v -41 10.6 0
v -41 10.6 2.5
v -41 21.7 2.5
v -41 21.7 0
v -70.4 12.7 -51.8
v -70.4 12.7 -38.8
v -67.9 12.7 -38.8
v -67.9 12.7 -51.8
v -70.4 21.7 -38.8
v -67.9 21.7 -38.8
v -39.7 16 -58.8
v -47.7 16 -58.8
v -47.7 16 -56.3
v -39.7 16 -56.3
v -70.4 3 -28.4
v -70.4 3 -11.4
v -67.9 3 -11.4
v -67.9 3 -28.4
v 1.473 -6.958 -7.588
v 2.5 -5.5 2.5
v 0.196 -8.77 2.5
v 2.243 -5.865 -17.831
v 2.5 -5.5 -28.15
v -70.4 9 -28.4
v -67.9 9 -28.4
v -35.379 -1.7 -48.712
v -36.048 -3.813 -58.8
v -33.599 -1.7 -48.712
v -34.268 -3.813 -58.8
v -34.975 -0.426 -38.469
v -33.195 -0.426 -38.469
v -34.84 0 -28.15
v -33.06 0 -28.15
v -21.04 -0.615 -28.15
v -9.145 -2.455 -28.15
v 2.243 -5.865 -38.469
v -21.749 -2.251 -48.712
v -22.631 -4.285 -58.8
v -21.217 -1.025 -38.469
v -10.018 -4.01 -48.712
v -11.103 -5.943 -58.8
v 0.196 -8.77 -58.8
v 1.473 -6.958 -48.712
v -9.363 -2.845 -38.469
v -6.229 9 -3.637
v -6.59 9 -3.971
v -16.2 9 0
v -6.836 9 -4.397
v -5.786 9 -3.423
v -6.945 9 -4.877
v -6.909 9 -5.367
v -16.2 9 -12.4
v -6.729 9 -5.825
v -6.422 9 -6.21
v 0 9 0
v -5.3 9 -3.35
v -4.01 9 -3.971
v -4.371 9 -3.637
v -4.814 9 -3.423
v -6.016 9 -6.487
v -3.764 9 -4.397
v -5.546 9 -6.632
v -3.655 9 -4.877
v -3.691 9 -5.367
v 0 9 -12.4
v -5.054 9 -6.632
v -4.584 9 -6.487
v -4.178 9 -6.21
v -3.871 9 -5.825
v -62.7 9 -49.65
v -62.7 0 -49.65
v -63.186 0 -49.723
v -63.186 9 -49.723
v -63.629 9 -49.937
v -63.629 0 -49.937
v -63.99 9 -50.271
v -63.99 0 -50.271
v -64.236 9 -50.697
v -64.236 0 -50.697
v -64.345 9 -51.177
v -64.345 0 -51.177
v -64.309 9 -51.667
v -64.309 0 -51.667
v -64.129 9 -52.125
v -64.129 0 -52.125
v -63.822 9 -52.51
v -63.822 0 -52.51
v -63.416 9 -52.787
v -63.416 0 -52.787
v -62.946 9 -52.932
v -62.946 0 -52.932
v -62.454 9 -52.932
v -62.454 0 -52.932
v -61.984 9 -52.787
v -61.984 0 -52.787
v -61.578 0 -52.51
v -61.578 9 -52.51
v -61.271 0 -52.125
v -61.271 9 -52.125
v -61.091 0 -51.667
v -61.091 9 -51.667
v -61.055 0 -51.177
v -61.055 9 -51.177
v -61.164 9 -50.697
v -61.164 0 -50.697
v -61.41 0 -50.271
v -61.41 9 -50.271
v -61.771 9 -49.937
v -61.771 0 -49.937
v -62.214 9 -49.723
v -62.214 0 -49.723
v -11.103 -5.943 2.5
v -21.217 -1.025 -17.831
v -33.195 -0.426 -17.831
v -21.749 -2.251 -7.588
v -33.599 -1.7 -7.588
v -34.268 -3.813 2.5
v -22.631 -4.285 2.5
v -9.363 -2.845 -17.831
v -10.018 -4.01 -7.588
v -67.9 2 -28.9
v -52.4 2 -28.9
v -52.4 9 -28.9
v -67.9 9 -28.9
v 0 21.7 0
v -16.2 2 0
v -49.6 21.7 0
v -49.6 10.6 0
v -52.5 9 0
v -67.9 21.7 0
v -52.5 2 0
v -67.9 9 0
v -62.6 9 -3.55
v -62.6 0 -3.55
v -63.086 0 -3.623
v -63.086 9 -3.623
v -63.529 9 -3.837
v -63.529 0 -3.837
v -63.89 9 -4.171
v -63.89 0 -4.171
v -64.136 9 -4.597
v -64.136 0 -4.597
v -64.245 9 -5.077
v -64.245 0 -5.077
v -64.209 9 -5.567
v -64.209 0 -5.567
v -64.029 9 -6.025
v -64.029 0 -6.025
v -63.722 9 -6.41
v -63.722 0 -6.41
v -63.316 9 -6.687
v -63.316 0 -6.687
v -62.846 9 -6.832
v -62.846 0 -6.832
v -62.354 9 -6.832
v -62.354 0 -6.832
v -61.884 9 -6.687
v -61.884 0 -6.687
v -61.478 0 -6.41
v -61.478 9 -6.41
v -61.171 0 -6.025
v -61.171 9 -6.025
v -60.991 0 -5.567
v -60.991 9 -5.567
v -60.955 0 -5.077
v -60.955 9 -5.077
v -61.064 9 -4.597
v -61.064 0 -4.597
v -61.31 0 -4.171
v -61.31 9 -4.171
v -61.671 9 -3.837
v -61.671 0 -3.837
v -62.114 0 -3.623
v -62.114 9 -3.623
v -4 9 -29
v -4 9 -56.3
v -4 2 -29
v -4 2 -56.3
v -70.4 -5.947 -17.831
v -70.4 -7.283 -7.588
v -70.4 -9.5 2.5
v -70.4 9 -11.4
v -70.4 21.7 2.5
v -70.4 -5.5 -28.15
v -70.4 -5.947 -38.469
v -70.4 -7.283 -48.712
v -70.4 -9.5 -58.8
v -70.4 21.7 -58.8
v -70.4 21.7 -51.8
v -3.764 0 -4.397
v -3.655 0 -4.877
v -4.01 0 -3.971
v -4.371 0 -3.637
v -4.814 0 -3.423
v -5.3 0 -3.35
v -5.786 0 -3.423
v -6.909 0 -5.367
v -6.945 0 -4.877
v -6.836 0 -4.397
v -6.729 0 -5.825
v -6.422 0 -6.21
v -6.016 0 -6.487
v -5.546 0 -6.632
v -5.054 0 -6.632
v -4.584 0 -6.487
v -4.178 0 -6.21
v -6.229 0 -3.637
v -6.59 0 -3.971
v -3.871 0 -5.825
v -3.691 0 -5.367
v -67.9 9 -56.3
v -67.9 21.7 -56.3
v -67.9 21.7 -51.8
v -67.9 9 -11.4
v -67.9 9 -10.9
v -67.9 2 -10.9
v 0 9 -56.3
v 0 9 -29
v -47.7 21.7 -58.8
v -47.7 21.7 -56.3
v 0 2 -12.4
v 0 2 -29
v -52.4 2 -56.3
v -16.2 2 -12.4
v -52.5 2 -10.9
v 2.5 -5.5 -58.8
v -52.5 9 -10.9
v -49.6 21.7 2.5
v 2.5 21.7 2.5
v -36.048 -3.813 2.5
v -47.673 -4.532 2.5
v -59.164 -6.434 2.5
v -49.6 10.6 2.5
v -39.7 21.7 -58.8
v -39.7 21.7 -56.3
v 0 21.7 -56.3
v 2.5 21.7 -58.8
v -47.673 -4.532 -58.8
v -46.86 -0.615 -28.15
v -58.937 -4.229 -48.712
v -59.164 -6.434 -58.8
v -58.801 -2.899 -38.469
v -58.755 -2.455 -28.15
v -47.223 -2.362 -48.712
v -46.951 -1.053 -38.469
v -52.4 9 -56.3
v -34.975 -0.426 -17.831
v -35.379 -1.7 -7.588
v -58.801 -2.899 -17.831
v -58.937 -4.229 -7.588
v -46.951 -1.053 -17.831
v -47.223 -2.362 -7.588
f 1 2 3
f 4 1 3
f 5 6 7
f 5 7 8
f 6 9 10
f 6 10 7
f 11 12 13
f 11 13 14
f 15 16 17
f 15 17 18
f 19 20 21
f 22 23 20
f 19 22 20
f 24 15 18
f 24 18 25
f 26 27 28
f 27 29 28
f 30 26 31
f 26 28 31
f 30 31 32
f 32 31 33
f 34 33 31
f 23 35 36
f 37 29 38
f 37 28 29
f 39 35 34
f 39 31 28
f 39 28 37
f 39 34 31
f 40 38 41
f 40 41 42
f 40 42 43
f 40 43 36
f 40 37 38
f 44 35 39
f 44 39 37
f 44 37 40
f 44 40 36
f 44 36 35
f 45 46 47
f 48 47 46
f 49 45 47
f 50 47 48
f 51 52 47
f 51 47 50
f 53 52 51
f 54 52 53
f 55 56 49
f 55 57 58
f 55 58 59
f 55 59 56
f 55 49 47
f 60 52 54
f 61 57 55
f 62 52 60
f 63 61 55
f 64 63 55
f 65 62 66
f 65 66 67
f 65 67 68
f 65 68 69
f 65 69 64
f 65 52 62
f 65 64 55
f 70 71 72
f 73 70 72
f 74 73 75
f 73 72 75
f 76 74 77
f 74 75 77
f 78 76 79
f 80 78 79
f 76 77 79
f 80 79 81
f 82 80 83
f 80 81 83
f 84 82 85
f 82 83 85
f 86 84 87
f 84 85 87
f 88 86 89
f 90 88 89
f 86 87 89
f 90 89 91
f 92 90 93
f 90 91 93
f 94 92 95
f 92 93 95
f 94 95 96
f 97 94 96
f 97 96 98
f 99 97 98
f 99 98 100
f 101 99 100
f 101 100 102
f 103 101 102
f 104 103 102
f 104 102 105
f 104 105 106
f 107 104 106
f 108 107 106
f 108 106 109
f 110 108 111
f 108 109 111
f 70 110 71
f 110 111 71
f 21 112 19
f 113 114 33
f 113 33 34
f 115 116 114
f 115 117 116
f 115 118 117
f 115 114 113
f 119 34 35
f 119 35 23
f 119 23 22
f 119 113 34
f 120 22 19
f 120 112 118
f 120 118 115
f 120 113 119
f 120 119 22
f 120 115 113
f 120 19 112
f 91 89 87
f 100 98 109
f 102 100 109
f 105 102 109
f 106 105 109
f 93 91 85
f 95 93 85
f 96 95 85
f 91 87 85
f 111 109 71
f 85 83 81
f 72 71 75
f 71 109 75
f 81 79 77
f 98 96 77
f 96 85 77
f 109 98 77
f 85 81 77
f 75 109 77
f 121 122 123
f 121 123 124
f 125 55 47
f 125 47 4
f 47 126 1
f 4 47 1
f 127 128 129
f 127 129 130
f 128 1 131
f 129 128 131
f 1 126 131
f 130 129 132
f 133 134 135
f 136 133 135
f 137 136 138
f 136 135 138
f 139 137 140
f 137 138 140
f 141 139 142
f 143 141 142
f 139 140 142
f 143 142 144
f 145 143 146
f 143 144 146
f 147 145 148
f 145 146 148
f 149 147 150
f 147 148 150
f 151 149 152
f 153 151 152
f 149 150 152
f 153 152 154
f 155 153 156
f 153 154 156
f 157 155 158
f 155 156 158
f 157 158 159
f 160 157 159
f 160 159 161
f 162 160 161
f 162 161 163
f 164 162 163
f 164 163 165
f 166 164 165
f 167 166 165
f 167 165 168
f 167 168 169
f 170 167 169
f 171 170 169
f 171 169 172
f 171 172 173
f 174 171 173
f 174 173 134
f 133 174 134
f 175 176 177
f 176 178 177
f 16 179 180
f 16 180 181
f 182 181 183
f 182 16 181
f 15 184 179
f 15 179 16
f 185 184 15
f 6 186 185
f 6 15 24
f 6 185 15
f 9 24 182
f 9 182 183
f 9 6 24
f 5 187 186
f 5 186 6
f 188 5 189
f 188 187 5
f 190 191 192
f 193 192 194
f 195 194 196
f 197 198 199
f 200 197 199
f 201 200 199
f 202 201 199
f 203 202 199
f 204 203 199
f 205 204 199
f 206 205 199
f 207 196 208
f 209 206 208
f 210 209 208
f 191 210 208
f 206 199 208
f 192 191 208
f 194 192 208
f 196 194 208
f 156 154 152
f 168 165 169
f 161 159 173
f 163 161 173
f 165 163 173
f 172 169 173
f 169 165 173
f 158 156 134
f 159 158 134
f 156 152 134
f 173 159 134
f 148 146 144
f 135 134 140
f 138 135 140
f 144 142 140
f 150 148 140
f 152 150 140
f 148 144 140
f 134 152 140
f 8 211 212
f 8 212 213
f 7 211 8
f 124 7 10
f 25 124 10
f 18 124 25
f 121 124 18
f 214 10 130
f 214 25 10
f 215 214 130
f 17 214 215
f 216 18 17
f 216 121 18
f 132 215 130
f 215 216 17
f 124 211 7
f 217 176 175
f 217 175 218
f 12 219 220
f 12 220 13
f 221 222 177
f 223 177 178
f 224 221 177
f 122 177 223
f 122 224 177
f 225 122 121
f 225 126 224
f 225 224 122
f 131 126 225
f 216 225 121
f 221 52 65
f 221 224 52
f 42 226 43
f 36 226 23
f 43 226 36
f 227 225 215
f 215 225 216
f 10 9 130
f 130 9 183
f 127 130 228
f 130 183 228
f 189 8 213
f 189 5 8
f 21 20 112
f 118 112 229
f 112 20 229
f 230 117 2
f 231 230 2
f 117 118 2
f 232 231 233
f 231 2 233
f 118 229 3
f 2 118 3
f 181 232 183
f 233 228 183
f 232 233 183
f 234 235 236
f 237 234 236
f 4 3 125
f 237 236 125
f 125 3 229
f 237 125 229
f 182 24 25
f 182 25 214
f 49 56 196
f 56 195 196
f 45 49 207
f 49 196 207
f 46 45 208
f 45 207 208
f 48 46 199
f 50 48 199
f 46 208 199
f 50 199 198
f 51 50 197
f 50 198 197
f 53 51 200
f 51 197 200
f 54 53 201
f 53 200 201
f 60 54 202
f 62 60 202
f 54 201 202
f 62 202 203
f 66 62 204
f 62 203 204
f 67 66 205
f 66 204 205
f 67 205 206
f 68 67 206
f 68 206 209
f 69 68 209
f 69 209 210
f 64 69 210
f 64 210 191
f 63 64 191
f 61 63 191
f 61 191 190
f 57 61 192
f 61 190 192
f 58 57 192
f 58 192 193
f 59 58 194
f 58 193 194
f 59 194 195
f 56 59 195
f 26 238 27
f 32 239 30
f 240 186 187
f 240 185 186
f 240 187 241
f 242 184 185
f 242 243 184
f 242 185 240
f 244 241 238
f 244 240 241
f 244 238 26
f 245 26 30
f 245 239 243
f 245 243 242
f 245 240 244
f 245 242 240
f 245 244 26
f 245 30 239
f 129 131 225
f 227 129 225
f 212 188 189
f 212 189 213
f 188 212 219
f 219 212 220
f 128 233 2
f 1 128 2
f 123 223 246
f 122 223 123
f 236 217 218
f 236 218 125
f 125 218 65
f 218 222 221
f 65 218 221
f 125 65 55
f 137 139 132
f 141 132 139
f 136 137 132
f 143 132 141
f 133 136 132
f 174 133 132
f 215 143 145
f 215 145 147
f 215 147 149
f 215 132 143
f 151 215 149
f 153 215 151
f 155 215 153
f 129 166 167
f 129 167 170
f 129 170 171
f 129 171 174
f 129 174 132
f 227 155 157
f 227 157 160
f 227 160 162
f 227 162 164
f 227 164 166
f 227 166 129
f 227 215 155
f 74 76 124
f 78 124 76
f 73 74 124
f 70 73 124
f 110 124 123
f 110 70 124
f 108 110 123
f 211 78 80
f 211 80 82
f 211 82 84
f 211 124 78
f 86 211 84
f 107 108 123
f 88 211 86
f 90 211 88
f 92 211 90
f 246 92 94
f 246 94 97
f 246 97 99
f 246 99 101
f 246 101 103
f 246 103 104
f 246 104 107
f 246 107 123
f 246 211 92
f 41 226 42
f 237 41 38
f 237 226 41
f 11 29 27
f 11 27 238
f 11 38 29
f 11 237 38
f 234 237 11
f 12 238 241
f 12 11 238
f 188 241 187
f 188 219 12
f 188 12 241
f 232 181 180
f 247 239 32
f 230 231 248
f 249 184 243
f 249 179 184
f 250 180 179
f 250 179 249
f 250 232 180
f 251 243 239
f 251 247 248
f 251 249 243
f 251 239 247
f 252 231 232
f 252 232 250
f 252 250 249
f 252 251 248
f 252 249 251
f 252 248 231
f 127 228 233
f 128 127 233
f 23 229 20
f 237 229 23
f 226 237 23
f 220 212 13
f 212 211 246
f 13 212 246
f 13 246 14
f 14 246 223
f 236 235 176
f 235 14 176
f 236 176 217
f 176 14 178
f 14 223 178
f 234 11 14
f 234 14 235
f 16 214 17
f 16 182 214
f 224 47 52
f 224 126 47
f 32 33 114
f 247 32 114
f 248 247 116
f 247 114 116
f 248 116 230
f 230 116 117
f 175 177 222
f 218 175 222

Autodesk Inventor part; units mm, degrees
ref_plane "YZ Plane" through (0, 0, 0) normal (1, 0, 0) x (0, 1, 0)
ref_plane "XZ Plane" through (0, 0, 0) normal (0, 1, 0) x (-1, 0, 0)
sketch "Sketch1" plane through (0, 0, 0) normal (0, 1, 0) x (-1, 0, 0)
  line L0 (0, 0) -> (67.9, 0)
  line L1 (67.9, 0) -> (67.9, -56.3)
  line L2 (67.9, -56.3) -> (0, -56.3)
  line L3 (0, -56.3) -> (0, 0)
  dimension "d4" = 67.9
  dimension "d5" = 56.3
extrude "Extrusion1" add sketch "Sketch1" along normal blind 2
sketch "Sketch4" plane through (0, 0, 0) normal (0, -1, 0) x (1, 0, 0)
  line L0 (2.5, 2.5) -> (-70.4, 2.5)
  line L1 (-70.4, 2.5) -> (-70.4, -58.8)
  line L2 (-70.4, -58.8) -> (2.5, -58.8)
  line L3 (2.5, -58.8) -> (2.5, 2.5)
  line L4 (0, -56.3) -> (0, 0) projected
  line L5 (0, 0) -> (-67.9, 0) projected
  line L6 (-67.9, -56.3) -> (0, -56.3) projected
  line L7 (-67.9, -56.3) -> (-67.9, 0) projected
  line L8 (0, 0) -> (-67.9, 0)
  line L9 (-67.9, 0) -> (-67.9, -56.3)
  line L10 (-67.9, -56.3) -> (0, -56.3)
  line L11 (0, -56.3) -> (0, 0)
  point P0 (-67.7799, -40.4535)
  point P1 (-67.7799, -17.6706)
  dimension "d35" = 2.5
  dimension "d36" = 2.5
  dimension "d37" = 2.5
  dimension "d38" = 2.5
extrude "Extrusion3" add sketch "Sketch4" against normal blind 21.7
sketch "Sketch5" plane through (2.5, 0, -58.8) normal (0, 0, -1) x (-1, 0, 0)
  line L0 (0, 0) -> (0, -5.5)
  line L1 (0, 0) -> (35.56, 0)
  line L2 (0, 0) -> (72.9, 0) projected
  arc A0 (35.56, 0) -> (0, -5.5) centre (35.56, -117.7058) ccw
  line L3 (72.9, 0) -> (0, 0) projected
  point P0 (2.5, 0)
  dimension "d41" = 5.5
  dimension "d42" = 35.56
extrude "Extrusion4" add sketch "Sketch5" against normal up to surface (61.3 mm away)
ref_plane "Work Plane1" through (-33.95, 21.7, 2.5) normal (1, 0, 0) x (0, 0, -1)
mirror "Mirror1" about plane through (-33.95, 21.7, 2.5) normal (1, 0, 0) of "Extrusion4"
sketch "Sketch11" plane through (0, 2, 0) normal (0, 1, 0) x (1, 0, 0)
  line L0 (-67.9, 0) -> (0, 0) projected
  line L1 (0, 0) -> (0, 56.3) projected
  line L2 (0, 56.3) -> (-67.9, 56.3) projected
  line L3 (-67.9, 56.3) -> (-67.9, 0) projected
  line L4 (-67.9, 0) -> (-52.5, 0)
  line L5 (-52.5, 0) -> (-52.5, 10.9)
  line L6 (-52.5, 10.9) -> (-67.9, 10.9)
  line L7 (-67.9, 10.9) -> (-67.9, 0)
  line L8 (-67.9, 56.3) -> (-52.4, 56.3)
  line L9 (-52.4, 56.3) -> (-52.4, 28.9)
  line L10 (-52.4, 28.9) -> (-67.9, 28.9)
  line L11 (-67.9, 28.9) -> (-67.9, 56.3)
  line L12 (0, 0) -> (-16.2, 0)
  line L13 (-16.2, 0) -> (-16.2, 12.4)
  line L14 (-16.2, 12.4) -> (0, 12.4)
  line L15 (0, 12.4) -> (0, 0)
  line L16 (0, 0) -> (0, 56.3) projected
  line L17 (0, 56.3) -> (-4, 56.3)
  line L18 (-4, 56.3) -> (-4, 29)
  line L19 (-4, 29) -> (0, 29)
  line L20 (0, 29) -> (0, 56.3)
  dimension "d89" = 15.4
  dimension "d90" = 10.9
  dimension "d91" = 15.5
  dimension "d92" = 27.4
  dimension "d93" = 16.2
  dimension "d94" = 12.4
  dimension "d95" = 4
  dimension "d96" = 27.3
extrude "Extrusion7" add sketch "Sketch11" along normal blind 7 contours L3 L6 L5 L0 | L13 L14 L1 L0 | L3 L2 L9 L10 | L19 L18 L2 L1
sketch "Sketch12" plane through (0, 9, 0) normal (0, 1, 0) x (1, 0, 0)
  line L0 (0, 0) -> (-67.9, 0) projected
  line L1 (-67.9, 0) -> (-67.9, 56.3) projected
  line L2 (-67.9, 56.3) -> (0, 56.3) projected
  line L3 (0, 56.3) -> (0, 0) projected
  point P0 (-62.6, 5.2)
  point P1 (-5.3, 5)
  point P2 (-62.7, 51.3)
  dimension "d99" = 5.2
  dimension "d100" = 5.3
  dimension "d101" = 5.2
  dimension "d102" = 5
  dimension "d103" = 5
  dimension "d104" = 5.3
hole "Hole6" at (-62.6, 9, -5.2) at (-5.3, 9, -5) at (-62.7, 9, -51.3) direction (0, -1, 0) diameter 3.3 depth 9
sketch "Sketch13" plane through (-70.4, 0, 2.5) normal (0, 0, 1) x (1, 0, 0)
  line L0 (17.9, 9) -> (2.5, 9) projected
  line L1 (70.4, 9) -> (54.2, 9) projected
  line L2 (20.8, 10.6) -> (29.4, 10.6)
  line L3 (29.4, 10.6) -> (29.4, 21.7)
  line L4 (29.4, 21.7) -> (20.8, 21.7)
  line L5 (20.8, 21.7) -> (20.8, 10.6)
  line L6 (0, 21.7) -> (72.9, 21.7) projected
  point P0 (70.4, 0)
  point P1 (2.5, 21.7)
  dimension "d112" = 1.6
  dimension "d113" = 18.3
  dimension "d114" = 8.6
extrude "Extrusion8" cut sketch "Sketch13" against normal up to surface (2.5 mm away)
sketch "Sketch14" plane through (-70.4, 0, -58.8) normal (-1, 0, 0) x (0, 0, 1)
  line L0 (5.85, 9) -> (9.15, 9) projected
  line L1 (29.9, 9) -> (2.5, 9) projected
  line L2 (29.9, 9) -> (2.5, 9) projected
  line L3 (58.8, 9) -> (47.9, 9) projected
  line L4 (51.95, 9) -> (55.25, 9) projected
  line L5 (58.8, 9) -> (47.9, 9) projected
  line L6 (58.8, 9) -> (47.9, 9) projected
  line L7 (30.4, 9) -> (47.4, 9)
  line L8 (47.4, 9) -> (47.4, 3)
  line L9 (47.4, 3) -> (30.4, 3)
  line L10 (30.4, 3) -> (30.4, 9)
  point P0 (58.8, 0)
  dimension "d118" = 11.4
  dimension "d119" = 17
  dimension "d120" = 6
extrude "Extrusion9" cut sketch "Sketch14" against normal up to surface (2.5 mm away)
sketch "Sketch15" plane through (2.5, 0, -58.8) normal (0, 0, -1) x (-1, 0, 0)
  line L0 (63.55, 9) -> (66.85, 9) projected
  line L1 (70.4, 9) -> (54.9, 9) projected
  line L2 (70.4, 9) -> (54.9, 9) projected
  line L3 (6.5, 9) -> (2.5, 9) projected
  line L4 (6.5, 9) -> (2.5, 9) projected
  line L5 (50.2, 21.7) -> (50.2, 16)
  line L6 (50.2, 16) -> (42.2, 16)
  line L7 (42.2, 16) -> (42.2, 21.7)
  line L8 (37.34, 0) -> (35.56, 0) projected
  line L9 (72.9, 21.7) -> (72.9, -5.5) projected
  line L10 (0, 21.7) -> (72.9, 21.7) projected
  line L11 (0, 21.7) -> (0, -5.5) projected
  arc A0 (35.56, 0) -> (0, -5.5) centre (35.56, -117.7058) ccw projected
  arc A1 (72.9, -5.5) -> (37.34, 0) centre (37.34, -117.7058) ccw projected
  line L12 (54.9, 2) -> (70.4, 2) projected
  line L13 (70.4, 2) -> (55, 2) projected
  line L14 (55, 2) -> (18.7, 2) projected
  line L15 (18.7, 2) -> (2.5, 2) projected
  line L16 (2.5, 2) -> (6.5, 2) projected
  line L17 (6.5, 2) -> (54.9, 2) projected
  line L18 (6.15, 9) -> (9.45, 9) projected
  line L19 (2.5, 9) -> (18.7, 9) projected
  line L20 (2.5, 9) -> (18.7, 9) projected
  point P0 (2.5, 0)
  dimension "d124" = 39.7
  dimension "d126" = 7
  dimension "d127" = 8
extrude "Extrusion10" cut sketch "Sketch15" against normal up to surface (2.5 mm away) contours L5 L6 L7 L10
sketch "Sketch16" plane through (-70.4, 21.7, -58.8) normal (-1, 0, 0) x (0, 0, 1)
  line L0 (0, -21.7) -> (61.3, -21.7) projected
  line L1 (0, -27.2) -> (0, -21.7) projected
  line L2 (61.3, 0) -> (61.3, -27.2) projected
  line L3 (0, -27.2) -> (61.3, -27.2) projected
  arc A0 (61.3, -31.2) -> (0, -31.2) centre (30.65, -146.6278) ccw
  line L4 (0, -27.2) -> (61.3, -27.2) projected
  line L5 (0, -31.2) -> (0, -27.2)
  line L6 (61.3, -27.2) -> (61.3, -31.2)
  point P0 (58.8, -21.7)
  point P1 (30.65, -26.2)
  dimension "d134" = 4
  dimension "d136" = 4
sketch3d "3D Sketch1"
  arc A0 (-70.4, -5.5, -58.8) -> (-34.84, 0, -58.8) centre (-34.84, -117.7058, -58.8) ccw
  line L0 (-34.84, 0, -58.8) -> (-33.06, 0, -58.8)
  arc A1 (-33.06, 0, -58.8) -> (2.5, -5.5, -58.8) centre (-33.06, -117.7058, -58.8) ccw
sweep "Sweep1" add profiles "Sketch16" path "3D Sketch1" contours L3 A0 L5 | L6 A0 L3
sketch "Sketch17" plane through (-70.4, 21.7, -58.8) normal (-1, 0, 0) x (0, 0, 1)
  line L0 (30.4, -12.7) -> (47.4, -12.7) projected
  line L1 (47.4, -12.7) -> (47.4, -18.7) projected
  line L2 (47.4, -18.7) -> (30.4, -18.7) projected
  line L3 (30.4, -18.7) -> (30.4, -12.7) projected
  line L4 (61.3, 0) -> (61.3, -31.2) projected
  line L5 (0, 0) -> (61.3, 0) projected
  line L6 (0, 0) -> (0, -31.2) projected
  arc A0 (61.3, -31.2) -> (0, -31.2) centre (30.65, -146.6278) ccw projected
  line L7 (2.5, 0) -> (58.8, 0) projected
  line L8 (7, 0) -> (20, 0)
  line L9 (20, 0) -> (20, -9)
  line L10 (20, -9) -> (7, -9)
  line L11 (7, -9) -> (7, 0)
  point P0 (58.8, -21.7)
  dimension "d139" = 13
  dimension "d140" = 9
  dimension "d141" = 7
extrude "Extrusion11" cut sketch "Sketch17" against normal up to surface (2.5 mm away) contours L9 L10 L11 L5
sketch "Sketch18" plane through (-67.9, 9, 0) normal (1, 0, 0) x (0, 0, -1)
  line L0 (51.8, 12.7) -> (51.8, 3.7) projected
  line L1 (51.8, 3.7) -> (38.8, 3.7) projected
  line L2 (38.8, 3.7) -> (38.8, 12.7) projected
  line L3 (0, 12.7) -> (38.8, 12.7) projected
  line L4 (0, 0) -> (0, 12.7) projected
  line L5 (0, 0) -> (10.9, 0) projected
  line L6 (10.9, 0) -> (10.9, -7) projected
  line L7 (28.9, -7) -> (10.9, -7) projected
  line L8 (28.9, -7) -> (28.9, 0) projected
  line L9 (28.9, 0) -> (56.3, 0) projected
  line L10 (56.3, 0) -> (56.3, 12.7) projected
  line L11 (51.8, 12.7) -> (56.3, 12.7) projected
  line L12 (11.4, 0) -> (28.4, 0) projected
  line L13 (28.4, 0) -> (28.4, -6) projected
  line L14 (28.4, -6) -> (11.4, -6) projected
  line L15 (11.4, -6) -> (11.4, 0) projected
  line L16 (10.9, 3.7) -> (45.4, 3.7)
  line L17 (45.4, 3.7) -> (45.4, 1.7)
  line L18 (45.4, 1.7) -> (10.9, 1.7)
  line L19 (10.9, 1.7) -> (10.9, 3.7)
  line L20 (51.8, 3.7) -> (38.8, 3.7) projected
  line L21 (10.9, 0) -> (10.9, -7) projected
  point P0 (0, -9)
  dimension "d145" = 1.7
  dimension "d147" = 10.9
properties part number "Base"
